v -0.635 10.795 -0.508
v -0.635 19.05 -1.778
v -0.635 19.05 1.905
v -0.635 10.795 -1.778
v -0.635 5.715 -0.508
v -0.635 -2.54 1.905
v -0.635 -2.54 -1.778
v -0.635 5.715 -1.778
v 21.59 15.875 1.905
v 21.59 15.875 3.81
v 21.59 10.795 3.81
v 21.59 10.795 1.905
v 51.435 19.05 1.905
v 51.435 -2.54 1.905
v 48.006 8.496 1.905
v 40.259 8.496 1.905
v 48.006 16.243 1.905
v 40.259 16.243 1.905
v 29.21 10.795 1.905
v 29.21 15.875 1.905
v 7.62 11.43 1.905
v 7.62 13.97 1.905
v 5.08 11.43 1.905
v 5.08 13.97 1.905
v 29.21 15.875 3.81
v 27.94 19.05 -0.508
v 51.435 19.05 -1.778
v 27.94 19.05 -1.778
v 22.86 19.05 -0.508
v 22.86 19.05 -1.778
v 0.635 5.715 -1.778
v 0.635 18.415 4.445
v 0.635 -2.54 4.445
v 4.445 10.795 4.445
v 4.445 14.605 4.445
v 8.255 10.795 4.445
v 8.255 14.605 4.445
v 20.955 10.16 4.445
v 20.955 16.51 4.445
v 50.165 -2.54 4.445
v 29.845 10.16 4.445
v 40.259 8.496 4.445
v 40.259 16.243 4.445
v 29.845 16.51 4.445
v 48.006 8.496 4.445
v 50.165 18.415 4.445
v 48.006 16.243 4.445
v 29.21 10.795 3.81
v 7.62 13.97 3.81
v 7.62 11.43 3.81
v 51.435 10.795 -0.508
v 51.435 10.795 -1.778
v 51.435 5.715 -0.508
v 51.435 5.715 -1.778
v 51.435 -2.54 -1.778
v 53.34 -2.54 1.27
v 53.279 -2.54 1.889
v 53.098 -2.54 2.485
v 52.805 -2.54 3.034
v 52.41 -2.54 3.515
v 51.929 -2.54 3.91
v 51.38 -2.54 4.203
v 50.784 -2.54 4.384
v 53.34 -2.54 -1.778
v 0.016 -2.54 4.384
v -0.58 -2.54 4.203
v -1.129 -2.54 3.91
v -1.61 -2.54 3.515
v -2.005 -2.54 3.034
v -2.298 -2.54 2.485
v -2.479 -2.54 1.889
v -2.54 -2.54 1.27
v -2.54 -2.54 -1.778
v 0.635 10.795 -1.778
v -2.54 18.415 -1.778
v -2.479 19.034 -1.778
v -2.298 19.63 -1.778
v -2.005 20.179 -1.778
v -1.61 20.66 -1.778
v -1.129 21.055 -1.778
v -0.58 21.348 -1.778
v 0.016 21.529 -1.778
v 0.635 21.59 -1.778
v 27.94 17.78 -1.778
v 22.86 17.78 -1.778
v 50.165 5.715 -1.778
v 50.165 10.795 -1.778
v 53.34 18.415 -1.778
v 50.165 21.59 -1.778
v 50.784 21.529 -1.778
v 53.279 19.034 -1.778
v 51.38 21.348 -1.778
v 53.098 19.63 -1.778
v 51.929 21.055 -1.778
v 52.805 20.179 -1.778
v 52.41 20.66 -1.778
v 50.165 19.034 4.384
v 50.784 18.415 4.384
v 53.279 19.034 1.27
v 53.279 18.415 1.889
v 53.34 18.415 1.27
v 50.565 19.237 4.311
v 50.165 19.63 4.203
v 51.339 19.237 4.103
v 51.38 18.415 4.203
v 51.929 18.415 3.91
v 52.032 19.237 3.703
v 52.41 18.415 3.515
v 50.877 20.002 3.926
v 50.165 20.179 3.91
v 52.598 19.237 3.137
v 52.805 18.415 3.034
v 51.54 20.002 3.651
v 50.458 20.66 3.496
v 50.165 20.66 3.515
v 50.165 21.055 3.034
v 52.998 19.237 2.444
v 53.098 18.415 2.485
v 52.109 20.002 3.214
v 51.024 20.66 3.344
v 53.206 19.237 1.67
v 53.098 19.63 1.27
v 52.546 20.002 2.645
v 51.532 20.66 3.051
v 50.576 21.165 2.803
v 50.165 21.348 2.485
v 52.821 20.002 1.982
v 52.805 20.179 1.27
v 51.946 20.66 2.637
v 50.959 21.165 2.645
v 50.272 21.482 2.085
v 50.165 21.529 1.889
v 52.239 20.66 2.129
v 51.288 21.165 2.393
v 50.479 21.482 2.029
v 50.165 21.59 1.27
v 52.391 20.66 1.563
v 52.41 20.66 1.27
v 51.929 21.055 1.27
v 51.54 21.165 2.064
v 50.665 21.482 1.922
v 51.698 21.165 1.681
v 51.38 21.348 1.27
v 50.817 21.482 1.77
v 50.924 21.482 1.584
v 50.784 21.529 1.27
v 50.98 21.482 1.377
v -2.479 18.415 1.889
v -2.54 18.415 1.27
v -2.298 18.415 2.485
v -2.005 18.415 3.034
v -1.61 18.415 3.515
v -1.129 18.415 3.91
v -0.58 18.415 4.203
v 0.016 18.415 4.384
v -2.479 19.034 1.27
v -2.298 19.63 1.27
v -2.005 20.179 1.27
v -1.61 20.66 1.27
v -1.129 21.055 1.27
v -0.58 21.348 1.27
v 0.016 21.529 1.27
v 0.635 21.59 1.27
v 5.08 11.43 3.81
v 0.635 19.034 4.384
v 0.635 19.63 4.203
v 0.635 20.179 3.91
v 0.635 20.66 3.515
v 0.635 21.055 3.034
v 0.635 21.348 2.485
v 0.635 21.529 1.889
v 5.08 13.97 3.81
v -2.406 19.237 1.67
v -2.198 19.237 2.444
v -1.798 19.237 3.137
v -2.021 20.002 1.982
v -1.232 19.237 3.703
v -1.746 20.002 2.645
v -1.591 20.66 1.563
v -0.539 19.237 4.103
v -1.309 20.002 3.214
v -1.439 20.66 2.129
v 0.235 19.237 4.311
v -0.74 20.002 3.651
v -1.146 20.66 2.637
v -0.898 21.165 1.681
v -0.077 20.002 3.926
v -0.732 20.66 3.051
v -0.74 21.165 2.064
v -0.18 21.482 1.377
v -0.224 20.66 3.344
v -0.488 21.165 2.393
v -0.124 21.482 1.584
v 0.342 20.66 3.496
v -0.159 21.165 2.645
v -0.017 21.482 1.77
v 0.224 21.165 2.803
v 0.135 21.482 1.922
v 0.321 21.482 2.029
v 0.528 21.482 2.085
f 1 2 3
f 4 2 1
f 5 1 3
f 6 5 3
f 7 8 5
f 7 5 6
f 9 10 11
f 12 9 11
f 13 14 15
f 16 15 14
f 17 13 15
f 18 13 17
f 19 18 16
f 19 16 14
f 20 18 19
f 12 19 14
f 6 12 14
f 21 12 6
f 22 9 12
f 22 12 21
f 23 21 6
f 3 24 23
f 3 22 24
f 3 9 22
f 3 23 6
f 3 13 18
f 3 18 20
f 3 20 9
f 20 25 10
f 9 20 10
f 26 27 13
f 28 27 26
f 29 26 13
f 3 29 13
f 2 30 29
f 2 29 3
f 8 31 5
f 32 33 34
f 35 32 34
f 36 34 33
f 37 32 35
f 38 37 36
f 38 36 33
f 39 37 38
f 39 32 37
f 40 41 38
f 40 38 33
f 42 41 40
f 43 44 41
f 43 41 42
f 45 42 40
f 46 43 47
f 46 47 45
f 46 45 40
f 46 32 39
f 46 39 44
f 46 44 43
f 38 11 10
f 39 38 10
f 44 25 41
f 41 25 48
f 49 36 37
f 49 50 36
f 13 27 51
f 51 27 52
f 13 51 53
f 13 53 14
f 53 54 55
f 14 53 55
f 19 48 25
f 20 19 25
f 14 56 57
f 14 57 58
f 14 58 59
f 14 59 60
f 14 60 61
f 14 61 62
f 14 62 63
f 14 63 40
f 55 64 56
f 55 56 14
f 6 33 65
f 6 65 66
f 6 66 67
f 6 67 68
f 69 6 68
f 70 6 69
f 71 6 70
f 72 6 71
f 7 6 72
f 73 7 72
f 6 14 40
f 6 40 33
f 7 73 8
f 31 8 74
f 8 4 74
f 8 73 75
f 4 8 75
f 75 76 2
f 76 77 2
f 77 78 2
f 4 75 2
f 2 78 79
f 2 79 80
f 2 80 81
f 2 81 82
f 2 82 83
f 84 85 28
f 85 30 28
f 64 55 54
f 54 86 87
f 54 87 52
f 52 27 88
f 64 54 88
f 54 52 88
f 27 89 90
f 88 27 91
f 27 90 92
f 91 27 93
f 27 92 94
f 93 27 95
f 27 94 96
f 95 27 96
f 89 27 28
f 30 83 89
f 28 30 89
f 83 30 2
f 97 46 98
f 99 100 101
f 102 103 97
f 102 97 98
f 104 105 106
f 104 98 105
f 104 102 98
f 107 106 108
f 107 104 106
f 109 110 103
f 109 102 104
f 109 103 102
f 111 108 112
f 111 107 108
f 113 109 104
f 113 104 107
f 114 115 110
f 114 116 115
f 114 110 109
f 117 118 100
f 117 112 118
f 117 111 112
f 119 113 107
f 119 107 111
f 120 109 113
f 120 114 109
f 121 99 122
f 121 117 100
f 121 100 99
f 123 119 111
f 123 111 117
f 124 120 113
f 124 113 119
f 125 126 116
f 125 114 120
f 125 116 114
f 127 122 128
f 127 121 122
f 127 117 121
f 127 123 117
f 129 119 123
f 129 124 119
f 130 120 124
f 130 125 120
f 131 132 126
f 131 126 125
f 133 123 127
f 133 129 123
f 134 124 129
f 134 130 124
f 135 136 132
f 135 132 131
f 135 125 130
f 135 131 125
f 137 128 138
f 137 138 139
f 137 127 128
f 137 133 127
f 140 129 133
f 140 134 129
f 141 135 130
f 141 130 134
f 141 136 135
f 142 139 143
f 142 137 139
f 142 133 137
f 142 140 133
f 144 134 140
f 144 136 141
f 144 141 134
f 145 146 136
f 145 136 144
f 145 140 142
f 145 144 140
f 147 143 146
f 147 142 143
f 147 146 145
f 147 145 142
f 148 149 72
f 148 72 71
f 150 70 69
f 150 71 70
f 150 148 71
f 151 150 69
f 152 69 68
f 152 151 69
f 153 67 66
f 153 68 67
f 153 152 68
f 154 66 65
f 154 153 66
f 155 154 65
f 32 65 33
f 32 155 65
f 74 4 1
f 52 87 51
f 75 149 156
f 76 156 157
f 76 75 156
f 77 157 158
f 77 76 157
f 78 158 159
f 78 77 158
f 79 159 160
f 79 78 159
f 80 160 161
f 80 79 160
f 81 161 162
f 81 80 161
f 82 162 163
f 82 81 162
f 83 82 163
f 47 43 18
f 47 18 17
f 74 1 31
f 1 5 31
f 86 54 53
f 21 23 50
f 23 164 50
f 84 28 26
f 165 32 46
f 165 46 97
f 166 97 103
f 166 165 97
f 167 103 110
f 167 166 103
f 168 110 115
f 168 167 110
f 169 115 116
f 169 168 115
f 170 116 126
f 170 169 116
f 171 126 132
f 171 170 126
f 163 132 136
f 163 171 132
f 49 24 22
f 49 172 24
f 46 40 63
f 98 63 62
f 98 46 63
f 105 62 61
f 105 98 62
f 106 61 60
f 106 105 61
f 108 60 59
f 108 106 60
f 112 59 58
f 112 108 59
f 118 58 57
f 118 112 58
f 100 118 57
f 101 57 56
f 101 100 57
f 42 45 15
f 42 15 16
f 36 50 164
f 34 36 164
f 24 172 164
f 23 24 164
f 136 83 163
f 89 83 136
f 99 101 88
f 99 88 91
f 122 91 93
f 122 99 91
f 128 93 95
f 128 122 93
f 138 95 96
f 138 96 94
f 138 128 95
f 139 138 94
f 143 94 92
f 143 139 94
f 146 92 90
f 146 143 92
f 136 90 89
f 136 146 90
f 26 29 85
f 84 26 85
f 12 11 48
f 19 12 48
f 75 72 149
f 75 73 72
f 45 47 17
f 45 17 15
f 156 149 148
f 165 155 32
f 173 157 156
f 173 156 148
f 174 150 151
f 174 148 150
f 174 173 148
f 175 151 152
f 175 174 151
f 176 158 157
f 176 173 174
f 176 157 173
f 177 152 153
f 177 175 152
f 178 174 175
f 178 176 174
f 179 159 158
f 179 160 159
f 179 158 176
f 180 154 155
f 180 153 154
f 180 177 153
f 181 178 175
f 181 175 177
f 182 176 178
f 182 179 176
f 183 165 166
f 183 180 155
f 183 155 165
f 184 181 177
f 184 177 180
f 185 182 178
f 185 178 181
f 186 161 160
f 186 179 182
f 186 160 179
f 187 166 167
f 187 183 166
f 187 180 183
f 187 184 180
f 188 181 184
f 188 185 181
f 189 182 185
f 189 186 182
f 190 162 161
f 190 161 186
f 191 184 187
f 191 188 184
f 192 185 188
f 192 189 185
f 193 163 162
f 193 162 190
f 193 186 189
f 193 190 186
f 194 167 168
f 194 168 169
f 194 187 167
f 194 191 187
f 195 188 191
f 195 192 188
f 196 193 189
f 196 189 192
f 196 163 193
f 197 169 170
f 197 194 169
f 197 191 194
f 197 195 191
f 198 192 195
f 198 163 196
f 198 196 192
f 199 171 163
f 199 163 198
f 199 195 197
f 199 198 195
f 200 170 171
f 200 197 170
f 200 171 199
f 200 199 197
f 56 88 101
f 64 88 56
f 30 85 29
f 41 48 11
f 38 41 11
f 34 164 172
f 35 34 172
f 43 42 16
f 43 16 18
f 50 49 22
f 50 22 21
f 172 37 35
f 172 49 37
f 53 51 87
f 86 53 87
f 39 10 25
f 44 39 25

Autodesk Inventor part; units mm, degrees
ref_plane "YZ Plane" through (0, 0, 0) normal (1, 0, 0) x (0, 1, 0)
ref_plane "XZ Plane" through (0, 0, 0) normal (0, 1, 0) x (-1, 0, 0)
ref_plane "XY Plane" through (0, 0, 0) normal (0, 0, 1) x (1, 0, 0)
sketch "Sketch1" plane through (0, 0, 0) normal (0, 0, 1) x (1, 0, 0)
  line L0 (0, 0) -> (50.8, 0)
  line L1 (50.8, 0) -> (50.8, 19.05)
  line L2 (50.8, 19.05) -> (0, 19.05)
  line L3 (0, 19.05) -> (0, 0)
  line L4 (0, 0) -> (0, -2.54)
  line L5 (0, -2.54) -> (-2.54, -2.54)
  line L6 (-2.54, -2.54) -> (-2.54, 19.05)
  line L7 (-2.54, 19.05) -> (-2.54, 21.59)
  line L8 (-2.54, 21.59) -> (53.34, 21.59)
  line L9 (53.34, 21.59) -> (53.34, -2.54)
  line L10 (53.34, -2.54) -> (0, -2.54)
  dimension "d0" = 50.8
  dimension "d1" = 19.05
  dimension "d2" = 50.8
  dimension "d3" = 2.54
  dimension "d4" = 2.54
  dimension "d5" = 2.54
  dimension "d6" = 55.88
extrude "Extrusion1" add sketch "Sketch1" along normal blind 1.905
sketch "Sketch2" plane through (0, 0, 1.905) normal (0, 0, 1) x (1, 0, 0)
  line L0 (-2.54, -2.54) -> (-2.54, 21.59)
  line L1 (-2.54, 21.59) -> (53.34, 21.59)
  line L2 (53.34, 21.59) -> (-2.54, 21.59) projected
  line L3 (53.34, 21.59) -> (53.34, -2.54)
  line L4 (53.34, -2.54) -> (-2.54, -2.54)
  line L5 (-2.54, -2.54) -> (53.34, -2.54) projected
  point P0 (0, 0)
extrude "Extrusion2" add sketch "Sketch2" along normal blind 2.54
sketch "Sketch3" plane through (0, 0, 0) normal (0, 0, -1) x (-1, 0, 0)
  line L0 (0, 0) -> (2.54, 0)
  line L1 (2.54, 21.59) -> (2.54, -2.54) projected
  line L2 (2.54, 0) -> (2.54, 19.05)
  line L3 (2.54, 0) -> (0.635, 0)
  line L4 (0.635, 0) -> (0.635, 19.05)
  line L5 (0.635, 19.05) -> (0, 19.05)
  line L6 (0, 19.05) -> (0, 0)
  line L7 (0, 0) -> (-50.8, 0) projected
  line L8 (0, 19.05) -> (0.635, 19.05)
  line L9 (-50.8, 0) -> (-51.435, 0)
  line L10 (-51.435, 0) -> (-51.435, 19.05)
  line L11 (-51.435, 19.05) -> (-50.8, 19.05)
  line L12 (-50.8, 19.05) -> (-50.8, 0)
  dimension "d11" = 1.905
  dimension "d12" = 0.635
  dimension "d13" = 19.05
extrude "Extrusion3" cut sketch "Sketch3" against normal blind 1.905
sketch "Sketch4" plane through (0, 0, 0) normal (0, 0, -1) x (-1, 0, 0)
  line L0 (2.54, -2.54) -> (-53.34, -2.54) projected
  line L1 (0, 0) -> (-51.435, 0)
  line L2 (-51.435, 0) -> (-51.435, 19.05) projected
  line L3 (-51.435, 0) -> (-51.435, -2.54)
  line L4 (-51.435, -2.54) -> (0, -2.54)
  line L5 (0.635, 0) -> (0.635, -2.54)
  line L6 (0.635, 0) -> (0, 0)
  line L7 (0.635, 0) -> (-51.435, 0) projected
  line L8 (0.635, -2.54) -> (0, -2.54)
extrude "Extrusion4" cut sketch "Sketch4" against normal blind 1.905
sketch "Sketch5" plane through (0, 0, 4.445) normal (0, 0, 1) x (1, 0, 0)
  line L0 (-2.54, 21.59) -> (7.62, 21.59)
  line L1 (53.34, 21.59) -> (-2.54, 21.59) projected
  line L2 (7.62, 21.59) -> (7.62, 11.43)
  line L3 (-2.54, 21.59) -> (5.08, 21.59)
  line L4 (5.08, 21.59) -> (5.08, 13.97)
  line L5 (5.08, 13.97) -> (7.62, 13.97)
  line L6 (5.08, 13.97) -> (5.08, 11.43)
  line L7 (5.08, 11.43) -> (7.62, 11.43)
  line L8 (-2.54, 21.59) -> (26.67, 21.59)
  line L9 (-2.54, 21.59) -> (19.05, 21.59)
  line L10 (19.05, 10.795) -> (26.67, 10.795)
  line L11 (26.67, 18.415) -> (19.05, 18.415)
  line L12 (26.67, 21.59) -> (29.21, 21.59)
  line L13 (19.05, 21.59) -> (21.59, 21.59)
  line L14 (21.59, 10.795) -> (29.21, 10.795)
  line L15 (29.21, 10.795) -> (29.21, 21.59)
  line L16 (26.67, 18.415) -> (29.21, 18.415)
  line L17 (21.59, 21.59) -> (21.59, 18.415)
  line L18 (29.21, 18.415) -> (21.59, 18.415)
  line L19 (21.59, 18.415) -> (21.59, 10.795)
  line L20 (53.34, 21.59) -> (40.64, 21.59)
  line L21 (40.64, 21.59) -> (40.64, 8.89)
  line L22 (53.34, 21.59) -> (47.625, 21.59)
  line L23 (47.625, 21.59) -> (47.625, 15.875)
  line L24 (47.625, 15.875) -> (40.64, 15.875)
  line L25 (47.625, 15.875) -> (47.625, 8.89)
  line L26 (47.625, 8.89) -> (40.64, 8.89)
  point P0 (0, 0)
  dimension "d18" = 10.16
  dimension "d19" = 10.16
  dimension "d20" = 7.62
  dimension "d21" = 7.62
  dimension "d22" = 29.21
  dimension "d23" = 21.59
  dimension "d24" = 10.795
  dimension "d25" = 3.175
  dimension "d26" = 2.54
  dimension "d27" = 2.54
  dimension "d28" = 12.7
  dimension "d29" = 12.7
  dimension "d30" = 5.715
extrude "Extrusion5" cut sketch "Sketch5" against normal blind 2.54 contours L5 L2 L7 L6 | L25 L26 L21 L24 | L15 L14 L10 L19 L11 L16
move faces "Move1" translate (0, -2.54, 0) faces at (26.67, 18.415, 3.5983)
move faces "Move2" translate (0, 0, -0.635) faces at (34.0783, 20.7433, 0)
sketch "Sketch6" plane through (53.34, 21.59, -0.635) normal (0, 0, -1) x (-1, 0, 0)
  line L0 (1.905, -2.54) -> (1.905, -13.335)
  line L1 (1.905, -24.13) -> (1.905, -2.54) projected
  line L2 (1.905, -13.335) -> (1.905, -10.795)
  line L3 (1.905, -13.335) -> (1.905, -15.875)
  line L4 (1.905, -15.875) -> (3.175, -15.875)
  line L5 (3.175, -15.875) -> (3.175, -10.795)
  line L6 (3.175, -10.795) -> (1.905, -10.795)
  line L7 (1.905, -2.54) -> (27.94, -2.54)
  line L8 (1.905, -2.54) -> (53.975, -2.54) projected
  line L9 (27.94, -2.54) -> (30.48, -2.54)
  line L10 (27.94, -2.54) -> (25.4, -2.54)
  line L11 (25.4, -2.54) -> (25.4, -3.81)
  line L12 (25.4, -3.81) -> (30.48, -3.81)
  line L13 (30.48, -3.81) -> (30.48, -2.54)
  line L14 (53.975, -2.54) -> (53.975, -13.335)
  line L15 (53.975, -2.54) -> (53.975, -24.13) projected
  line L16 (53.975, -13.335) -> (53.975, -10.795)
  line L17 (53.975, -10.795) -> (52.705, -10.795)
  line L18 (52.705, -10.795) -> (52.705, -15.875)
  line L19 (52.705, -15.875) -> (53.975, -15.875)
  line L20 (53.975, -15.875) -> (53.975, -10.795)
  point P0 (53.34, -21.59)
  dimension "d39" = 10.795
  dimension "d40" = 2.54
  dimension "d41" = 2.54
  dimension "d42" = 5.08
  dimension "d43" = 26.035
  dimension "d44" = 2.54
  dimension "d45" = 2.54
  dimension "d46" = 1.27
  dimension "d47" = 5.08
  dimension "d48" = 10.795
  dimension "d49" = 2.54
  dimension "d51" = 1.27
  dimension "d52" = 5.08
extrude "Extrusion6" add sketch "Sketch6" against normal blind 0.889
move faces "Move3" translate (0, 0, -0.381) faces at (26.2467, 20.7433, -0.635)
move faces "Move4" translate (0, 0, -0.762) faces at (24.5533, 20.7433, -1.016)
sketch "Sketch10" plane through (50.165, 10.795, 0.254) normal (0, 1, 0) x (1, 0, 0)
  line L0 (1.27, 2.032) -> (1.27, 0) projected
  line L1 (1.27, 2.032) -> (1.27, 0.762)
  line L2 (0, 2.032) -> (0, 0) projected
  line L3 (1.27, 0.762) -> (0, 2.032)
  line L4 (1.27, 0) -> (0, 0) projected
  line L5 (0, 2.032) -> (0, 0)
  line L6 (0, 0) -> (1.27, 0)
  line L7 (1.27, 0) -> (1.27, 0.762)
  point P0 (-50.165, 0.254)
  dimension "d70" = 1.27
extrude "Extrusion10" cut sketch "Sketch10" against normal blind 25.4
sketch "Sketch11" plane through (22.86, 17.78, 0.254) normal (-1, 0, 0) x (0, 0, 1)
  line L0 (-2.032, 1.27) -> (-0.762, 1.27)
  line L1 (-2.032, 1.27) -> (0, 1.27) projected
  line L2 (-2.032, 0) -> (-2.032, 1.27) projected
  line L3 (-0.762, 1.27) -> (-2.032, 0)
  line L4 (-2.032, 0) -> (0, 0) projected
  line L5 (-2.032, 0) -> (0, 0)
  line L6 (0, 0) -> (0, 1.27)
  line L7 (0, 1.27) -> (-0.762, 1.27)
  point P0 (-0.254, -17.78)
  dimension "d73" = 1.27
extrude "Extrusion11" cut sketch "Sketch11" against normal blind 6.35 contours L1 L6 L4 L3
sketch "Sketch12" plane through (-0.635, 5.715, 0.254) normal (0, -1, 0) x (1, 0, 0)
  line L0 (1.27, -2.032) -> (0, -2.032) projected
  line L1 (0, -2.032) -> (0, -0.762)
  line L2 (0, -2.032) -> (0, 0) projected
  line L3 (0, -0.762) -> (1.27, -2.032)
  line L4 (1.27, -2.032) -> (1.27, 0)
  line L5 (0, 0) -> (1.27, 0) projected
  line L6 (1.27, 0) -> (0, 0)
  line L7 (0, 0) -> (0, -0.762)
  point P0 (0.635, -0.254)
  dimension "d76" = 1.27
extrude "Extrusion12" cut sketch "Sketch12" against normal blind 6.35 contours L3 L2 L5 L4
sketch "Sketch13" plane through (0, 0, 4.445) normal (0, 0, 1) x (1, 0, 0)
  line L0 (53.34, -2.54) -> (53.34, 21.59) projected
  line L1 (53.34, 21.59) -> (44.1325, 21.59)
  line L2 (53.34, 21.59) -> (-2.54, 21.59) projected
  line L3 (44.1325, 21.59) -> (44.1325, 16.2433)
  line L4 (48.006, 12.3825) -> (48.006, 8.4963)
  line L5 (48.006, 8.4963) -> (40.259, 8.4963)
  line L6 (40.259, 8.4963) -> (40.259, 16.2433)
  line L7 (40.259, 16.2433) -> (48.006, 16.2433)
  line L8 (48.006, 16.2433) -> (48.006, 12.3825)
  point P0 (0, 0)
  dimension "d79" = 9.2075
  dimension "d82" = 3.8862
  dimension "d83" = 7.747
  dimension "d84" = 7.747
  dimension "d85" = 7.747
extrude "Extrusion13" cut sketch "Sketch13" against normal blind 6.35
fillet "Fillet1" radius 3.175 2 edges at (-2.54, 9.525, 4.445) (53.34, 9.525, 4.445)
fillet "Fillet2" radius 3.175 5 edges at (-1.6101, 21.59, 3.5151) (-2.54, 21.59, -0.254) (52.4101, 21.59, 3.5151) (53.34, 21.59, -0.254) (25.4, 21.59, 4.445)
chamfer "Chamfer1" distance 0.635 angle 45 8 edges at (25.4, 15.875, 4.445) (29.21, 13.335, 4.445) (25.4, 10.795, 4.445) (21.59, 13.335, 4.445) (6.35, 13.97, 4.445) (7.62, 12.7, 4.445) (6.35, 11.43, 4.445) (5.08, 12.7, 4.445)
properties part number "PIUIODaughterBoardCover"
